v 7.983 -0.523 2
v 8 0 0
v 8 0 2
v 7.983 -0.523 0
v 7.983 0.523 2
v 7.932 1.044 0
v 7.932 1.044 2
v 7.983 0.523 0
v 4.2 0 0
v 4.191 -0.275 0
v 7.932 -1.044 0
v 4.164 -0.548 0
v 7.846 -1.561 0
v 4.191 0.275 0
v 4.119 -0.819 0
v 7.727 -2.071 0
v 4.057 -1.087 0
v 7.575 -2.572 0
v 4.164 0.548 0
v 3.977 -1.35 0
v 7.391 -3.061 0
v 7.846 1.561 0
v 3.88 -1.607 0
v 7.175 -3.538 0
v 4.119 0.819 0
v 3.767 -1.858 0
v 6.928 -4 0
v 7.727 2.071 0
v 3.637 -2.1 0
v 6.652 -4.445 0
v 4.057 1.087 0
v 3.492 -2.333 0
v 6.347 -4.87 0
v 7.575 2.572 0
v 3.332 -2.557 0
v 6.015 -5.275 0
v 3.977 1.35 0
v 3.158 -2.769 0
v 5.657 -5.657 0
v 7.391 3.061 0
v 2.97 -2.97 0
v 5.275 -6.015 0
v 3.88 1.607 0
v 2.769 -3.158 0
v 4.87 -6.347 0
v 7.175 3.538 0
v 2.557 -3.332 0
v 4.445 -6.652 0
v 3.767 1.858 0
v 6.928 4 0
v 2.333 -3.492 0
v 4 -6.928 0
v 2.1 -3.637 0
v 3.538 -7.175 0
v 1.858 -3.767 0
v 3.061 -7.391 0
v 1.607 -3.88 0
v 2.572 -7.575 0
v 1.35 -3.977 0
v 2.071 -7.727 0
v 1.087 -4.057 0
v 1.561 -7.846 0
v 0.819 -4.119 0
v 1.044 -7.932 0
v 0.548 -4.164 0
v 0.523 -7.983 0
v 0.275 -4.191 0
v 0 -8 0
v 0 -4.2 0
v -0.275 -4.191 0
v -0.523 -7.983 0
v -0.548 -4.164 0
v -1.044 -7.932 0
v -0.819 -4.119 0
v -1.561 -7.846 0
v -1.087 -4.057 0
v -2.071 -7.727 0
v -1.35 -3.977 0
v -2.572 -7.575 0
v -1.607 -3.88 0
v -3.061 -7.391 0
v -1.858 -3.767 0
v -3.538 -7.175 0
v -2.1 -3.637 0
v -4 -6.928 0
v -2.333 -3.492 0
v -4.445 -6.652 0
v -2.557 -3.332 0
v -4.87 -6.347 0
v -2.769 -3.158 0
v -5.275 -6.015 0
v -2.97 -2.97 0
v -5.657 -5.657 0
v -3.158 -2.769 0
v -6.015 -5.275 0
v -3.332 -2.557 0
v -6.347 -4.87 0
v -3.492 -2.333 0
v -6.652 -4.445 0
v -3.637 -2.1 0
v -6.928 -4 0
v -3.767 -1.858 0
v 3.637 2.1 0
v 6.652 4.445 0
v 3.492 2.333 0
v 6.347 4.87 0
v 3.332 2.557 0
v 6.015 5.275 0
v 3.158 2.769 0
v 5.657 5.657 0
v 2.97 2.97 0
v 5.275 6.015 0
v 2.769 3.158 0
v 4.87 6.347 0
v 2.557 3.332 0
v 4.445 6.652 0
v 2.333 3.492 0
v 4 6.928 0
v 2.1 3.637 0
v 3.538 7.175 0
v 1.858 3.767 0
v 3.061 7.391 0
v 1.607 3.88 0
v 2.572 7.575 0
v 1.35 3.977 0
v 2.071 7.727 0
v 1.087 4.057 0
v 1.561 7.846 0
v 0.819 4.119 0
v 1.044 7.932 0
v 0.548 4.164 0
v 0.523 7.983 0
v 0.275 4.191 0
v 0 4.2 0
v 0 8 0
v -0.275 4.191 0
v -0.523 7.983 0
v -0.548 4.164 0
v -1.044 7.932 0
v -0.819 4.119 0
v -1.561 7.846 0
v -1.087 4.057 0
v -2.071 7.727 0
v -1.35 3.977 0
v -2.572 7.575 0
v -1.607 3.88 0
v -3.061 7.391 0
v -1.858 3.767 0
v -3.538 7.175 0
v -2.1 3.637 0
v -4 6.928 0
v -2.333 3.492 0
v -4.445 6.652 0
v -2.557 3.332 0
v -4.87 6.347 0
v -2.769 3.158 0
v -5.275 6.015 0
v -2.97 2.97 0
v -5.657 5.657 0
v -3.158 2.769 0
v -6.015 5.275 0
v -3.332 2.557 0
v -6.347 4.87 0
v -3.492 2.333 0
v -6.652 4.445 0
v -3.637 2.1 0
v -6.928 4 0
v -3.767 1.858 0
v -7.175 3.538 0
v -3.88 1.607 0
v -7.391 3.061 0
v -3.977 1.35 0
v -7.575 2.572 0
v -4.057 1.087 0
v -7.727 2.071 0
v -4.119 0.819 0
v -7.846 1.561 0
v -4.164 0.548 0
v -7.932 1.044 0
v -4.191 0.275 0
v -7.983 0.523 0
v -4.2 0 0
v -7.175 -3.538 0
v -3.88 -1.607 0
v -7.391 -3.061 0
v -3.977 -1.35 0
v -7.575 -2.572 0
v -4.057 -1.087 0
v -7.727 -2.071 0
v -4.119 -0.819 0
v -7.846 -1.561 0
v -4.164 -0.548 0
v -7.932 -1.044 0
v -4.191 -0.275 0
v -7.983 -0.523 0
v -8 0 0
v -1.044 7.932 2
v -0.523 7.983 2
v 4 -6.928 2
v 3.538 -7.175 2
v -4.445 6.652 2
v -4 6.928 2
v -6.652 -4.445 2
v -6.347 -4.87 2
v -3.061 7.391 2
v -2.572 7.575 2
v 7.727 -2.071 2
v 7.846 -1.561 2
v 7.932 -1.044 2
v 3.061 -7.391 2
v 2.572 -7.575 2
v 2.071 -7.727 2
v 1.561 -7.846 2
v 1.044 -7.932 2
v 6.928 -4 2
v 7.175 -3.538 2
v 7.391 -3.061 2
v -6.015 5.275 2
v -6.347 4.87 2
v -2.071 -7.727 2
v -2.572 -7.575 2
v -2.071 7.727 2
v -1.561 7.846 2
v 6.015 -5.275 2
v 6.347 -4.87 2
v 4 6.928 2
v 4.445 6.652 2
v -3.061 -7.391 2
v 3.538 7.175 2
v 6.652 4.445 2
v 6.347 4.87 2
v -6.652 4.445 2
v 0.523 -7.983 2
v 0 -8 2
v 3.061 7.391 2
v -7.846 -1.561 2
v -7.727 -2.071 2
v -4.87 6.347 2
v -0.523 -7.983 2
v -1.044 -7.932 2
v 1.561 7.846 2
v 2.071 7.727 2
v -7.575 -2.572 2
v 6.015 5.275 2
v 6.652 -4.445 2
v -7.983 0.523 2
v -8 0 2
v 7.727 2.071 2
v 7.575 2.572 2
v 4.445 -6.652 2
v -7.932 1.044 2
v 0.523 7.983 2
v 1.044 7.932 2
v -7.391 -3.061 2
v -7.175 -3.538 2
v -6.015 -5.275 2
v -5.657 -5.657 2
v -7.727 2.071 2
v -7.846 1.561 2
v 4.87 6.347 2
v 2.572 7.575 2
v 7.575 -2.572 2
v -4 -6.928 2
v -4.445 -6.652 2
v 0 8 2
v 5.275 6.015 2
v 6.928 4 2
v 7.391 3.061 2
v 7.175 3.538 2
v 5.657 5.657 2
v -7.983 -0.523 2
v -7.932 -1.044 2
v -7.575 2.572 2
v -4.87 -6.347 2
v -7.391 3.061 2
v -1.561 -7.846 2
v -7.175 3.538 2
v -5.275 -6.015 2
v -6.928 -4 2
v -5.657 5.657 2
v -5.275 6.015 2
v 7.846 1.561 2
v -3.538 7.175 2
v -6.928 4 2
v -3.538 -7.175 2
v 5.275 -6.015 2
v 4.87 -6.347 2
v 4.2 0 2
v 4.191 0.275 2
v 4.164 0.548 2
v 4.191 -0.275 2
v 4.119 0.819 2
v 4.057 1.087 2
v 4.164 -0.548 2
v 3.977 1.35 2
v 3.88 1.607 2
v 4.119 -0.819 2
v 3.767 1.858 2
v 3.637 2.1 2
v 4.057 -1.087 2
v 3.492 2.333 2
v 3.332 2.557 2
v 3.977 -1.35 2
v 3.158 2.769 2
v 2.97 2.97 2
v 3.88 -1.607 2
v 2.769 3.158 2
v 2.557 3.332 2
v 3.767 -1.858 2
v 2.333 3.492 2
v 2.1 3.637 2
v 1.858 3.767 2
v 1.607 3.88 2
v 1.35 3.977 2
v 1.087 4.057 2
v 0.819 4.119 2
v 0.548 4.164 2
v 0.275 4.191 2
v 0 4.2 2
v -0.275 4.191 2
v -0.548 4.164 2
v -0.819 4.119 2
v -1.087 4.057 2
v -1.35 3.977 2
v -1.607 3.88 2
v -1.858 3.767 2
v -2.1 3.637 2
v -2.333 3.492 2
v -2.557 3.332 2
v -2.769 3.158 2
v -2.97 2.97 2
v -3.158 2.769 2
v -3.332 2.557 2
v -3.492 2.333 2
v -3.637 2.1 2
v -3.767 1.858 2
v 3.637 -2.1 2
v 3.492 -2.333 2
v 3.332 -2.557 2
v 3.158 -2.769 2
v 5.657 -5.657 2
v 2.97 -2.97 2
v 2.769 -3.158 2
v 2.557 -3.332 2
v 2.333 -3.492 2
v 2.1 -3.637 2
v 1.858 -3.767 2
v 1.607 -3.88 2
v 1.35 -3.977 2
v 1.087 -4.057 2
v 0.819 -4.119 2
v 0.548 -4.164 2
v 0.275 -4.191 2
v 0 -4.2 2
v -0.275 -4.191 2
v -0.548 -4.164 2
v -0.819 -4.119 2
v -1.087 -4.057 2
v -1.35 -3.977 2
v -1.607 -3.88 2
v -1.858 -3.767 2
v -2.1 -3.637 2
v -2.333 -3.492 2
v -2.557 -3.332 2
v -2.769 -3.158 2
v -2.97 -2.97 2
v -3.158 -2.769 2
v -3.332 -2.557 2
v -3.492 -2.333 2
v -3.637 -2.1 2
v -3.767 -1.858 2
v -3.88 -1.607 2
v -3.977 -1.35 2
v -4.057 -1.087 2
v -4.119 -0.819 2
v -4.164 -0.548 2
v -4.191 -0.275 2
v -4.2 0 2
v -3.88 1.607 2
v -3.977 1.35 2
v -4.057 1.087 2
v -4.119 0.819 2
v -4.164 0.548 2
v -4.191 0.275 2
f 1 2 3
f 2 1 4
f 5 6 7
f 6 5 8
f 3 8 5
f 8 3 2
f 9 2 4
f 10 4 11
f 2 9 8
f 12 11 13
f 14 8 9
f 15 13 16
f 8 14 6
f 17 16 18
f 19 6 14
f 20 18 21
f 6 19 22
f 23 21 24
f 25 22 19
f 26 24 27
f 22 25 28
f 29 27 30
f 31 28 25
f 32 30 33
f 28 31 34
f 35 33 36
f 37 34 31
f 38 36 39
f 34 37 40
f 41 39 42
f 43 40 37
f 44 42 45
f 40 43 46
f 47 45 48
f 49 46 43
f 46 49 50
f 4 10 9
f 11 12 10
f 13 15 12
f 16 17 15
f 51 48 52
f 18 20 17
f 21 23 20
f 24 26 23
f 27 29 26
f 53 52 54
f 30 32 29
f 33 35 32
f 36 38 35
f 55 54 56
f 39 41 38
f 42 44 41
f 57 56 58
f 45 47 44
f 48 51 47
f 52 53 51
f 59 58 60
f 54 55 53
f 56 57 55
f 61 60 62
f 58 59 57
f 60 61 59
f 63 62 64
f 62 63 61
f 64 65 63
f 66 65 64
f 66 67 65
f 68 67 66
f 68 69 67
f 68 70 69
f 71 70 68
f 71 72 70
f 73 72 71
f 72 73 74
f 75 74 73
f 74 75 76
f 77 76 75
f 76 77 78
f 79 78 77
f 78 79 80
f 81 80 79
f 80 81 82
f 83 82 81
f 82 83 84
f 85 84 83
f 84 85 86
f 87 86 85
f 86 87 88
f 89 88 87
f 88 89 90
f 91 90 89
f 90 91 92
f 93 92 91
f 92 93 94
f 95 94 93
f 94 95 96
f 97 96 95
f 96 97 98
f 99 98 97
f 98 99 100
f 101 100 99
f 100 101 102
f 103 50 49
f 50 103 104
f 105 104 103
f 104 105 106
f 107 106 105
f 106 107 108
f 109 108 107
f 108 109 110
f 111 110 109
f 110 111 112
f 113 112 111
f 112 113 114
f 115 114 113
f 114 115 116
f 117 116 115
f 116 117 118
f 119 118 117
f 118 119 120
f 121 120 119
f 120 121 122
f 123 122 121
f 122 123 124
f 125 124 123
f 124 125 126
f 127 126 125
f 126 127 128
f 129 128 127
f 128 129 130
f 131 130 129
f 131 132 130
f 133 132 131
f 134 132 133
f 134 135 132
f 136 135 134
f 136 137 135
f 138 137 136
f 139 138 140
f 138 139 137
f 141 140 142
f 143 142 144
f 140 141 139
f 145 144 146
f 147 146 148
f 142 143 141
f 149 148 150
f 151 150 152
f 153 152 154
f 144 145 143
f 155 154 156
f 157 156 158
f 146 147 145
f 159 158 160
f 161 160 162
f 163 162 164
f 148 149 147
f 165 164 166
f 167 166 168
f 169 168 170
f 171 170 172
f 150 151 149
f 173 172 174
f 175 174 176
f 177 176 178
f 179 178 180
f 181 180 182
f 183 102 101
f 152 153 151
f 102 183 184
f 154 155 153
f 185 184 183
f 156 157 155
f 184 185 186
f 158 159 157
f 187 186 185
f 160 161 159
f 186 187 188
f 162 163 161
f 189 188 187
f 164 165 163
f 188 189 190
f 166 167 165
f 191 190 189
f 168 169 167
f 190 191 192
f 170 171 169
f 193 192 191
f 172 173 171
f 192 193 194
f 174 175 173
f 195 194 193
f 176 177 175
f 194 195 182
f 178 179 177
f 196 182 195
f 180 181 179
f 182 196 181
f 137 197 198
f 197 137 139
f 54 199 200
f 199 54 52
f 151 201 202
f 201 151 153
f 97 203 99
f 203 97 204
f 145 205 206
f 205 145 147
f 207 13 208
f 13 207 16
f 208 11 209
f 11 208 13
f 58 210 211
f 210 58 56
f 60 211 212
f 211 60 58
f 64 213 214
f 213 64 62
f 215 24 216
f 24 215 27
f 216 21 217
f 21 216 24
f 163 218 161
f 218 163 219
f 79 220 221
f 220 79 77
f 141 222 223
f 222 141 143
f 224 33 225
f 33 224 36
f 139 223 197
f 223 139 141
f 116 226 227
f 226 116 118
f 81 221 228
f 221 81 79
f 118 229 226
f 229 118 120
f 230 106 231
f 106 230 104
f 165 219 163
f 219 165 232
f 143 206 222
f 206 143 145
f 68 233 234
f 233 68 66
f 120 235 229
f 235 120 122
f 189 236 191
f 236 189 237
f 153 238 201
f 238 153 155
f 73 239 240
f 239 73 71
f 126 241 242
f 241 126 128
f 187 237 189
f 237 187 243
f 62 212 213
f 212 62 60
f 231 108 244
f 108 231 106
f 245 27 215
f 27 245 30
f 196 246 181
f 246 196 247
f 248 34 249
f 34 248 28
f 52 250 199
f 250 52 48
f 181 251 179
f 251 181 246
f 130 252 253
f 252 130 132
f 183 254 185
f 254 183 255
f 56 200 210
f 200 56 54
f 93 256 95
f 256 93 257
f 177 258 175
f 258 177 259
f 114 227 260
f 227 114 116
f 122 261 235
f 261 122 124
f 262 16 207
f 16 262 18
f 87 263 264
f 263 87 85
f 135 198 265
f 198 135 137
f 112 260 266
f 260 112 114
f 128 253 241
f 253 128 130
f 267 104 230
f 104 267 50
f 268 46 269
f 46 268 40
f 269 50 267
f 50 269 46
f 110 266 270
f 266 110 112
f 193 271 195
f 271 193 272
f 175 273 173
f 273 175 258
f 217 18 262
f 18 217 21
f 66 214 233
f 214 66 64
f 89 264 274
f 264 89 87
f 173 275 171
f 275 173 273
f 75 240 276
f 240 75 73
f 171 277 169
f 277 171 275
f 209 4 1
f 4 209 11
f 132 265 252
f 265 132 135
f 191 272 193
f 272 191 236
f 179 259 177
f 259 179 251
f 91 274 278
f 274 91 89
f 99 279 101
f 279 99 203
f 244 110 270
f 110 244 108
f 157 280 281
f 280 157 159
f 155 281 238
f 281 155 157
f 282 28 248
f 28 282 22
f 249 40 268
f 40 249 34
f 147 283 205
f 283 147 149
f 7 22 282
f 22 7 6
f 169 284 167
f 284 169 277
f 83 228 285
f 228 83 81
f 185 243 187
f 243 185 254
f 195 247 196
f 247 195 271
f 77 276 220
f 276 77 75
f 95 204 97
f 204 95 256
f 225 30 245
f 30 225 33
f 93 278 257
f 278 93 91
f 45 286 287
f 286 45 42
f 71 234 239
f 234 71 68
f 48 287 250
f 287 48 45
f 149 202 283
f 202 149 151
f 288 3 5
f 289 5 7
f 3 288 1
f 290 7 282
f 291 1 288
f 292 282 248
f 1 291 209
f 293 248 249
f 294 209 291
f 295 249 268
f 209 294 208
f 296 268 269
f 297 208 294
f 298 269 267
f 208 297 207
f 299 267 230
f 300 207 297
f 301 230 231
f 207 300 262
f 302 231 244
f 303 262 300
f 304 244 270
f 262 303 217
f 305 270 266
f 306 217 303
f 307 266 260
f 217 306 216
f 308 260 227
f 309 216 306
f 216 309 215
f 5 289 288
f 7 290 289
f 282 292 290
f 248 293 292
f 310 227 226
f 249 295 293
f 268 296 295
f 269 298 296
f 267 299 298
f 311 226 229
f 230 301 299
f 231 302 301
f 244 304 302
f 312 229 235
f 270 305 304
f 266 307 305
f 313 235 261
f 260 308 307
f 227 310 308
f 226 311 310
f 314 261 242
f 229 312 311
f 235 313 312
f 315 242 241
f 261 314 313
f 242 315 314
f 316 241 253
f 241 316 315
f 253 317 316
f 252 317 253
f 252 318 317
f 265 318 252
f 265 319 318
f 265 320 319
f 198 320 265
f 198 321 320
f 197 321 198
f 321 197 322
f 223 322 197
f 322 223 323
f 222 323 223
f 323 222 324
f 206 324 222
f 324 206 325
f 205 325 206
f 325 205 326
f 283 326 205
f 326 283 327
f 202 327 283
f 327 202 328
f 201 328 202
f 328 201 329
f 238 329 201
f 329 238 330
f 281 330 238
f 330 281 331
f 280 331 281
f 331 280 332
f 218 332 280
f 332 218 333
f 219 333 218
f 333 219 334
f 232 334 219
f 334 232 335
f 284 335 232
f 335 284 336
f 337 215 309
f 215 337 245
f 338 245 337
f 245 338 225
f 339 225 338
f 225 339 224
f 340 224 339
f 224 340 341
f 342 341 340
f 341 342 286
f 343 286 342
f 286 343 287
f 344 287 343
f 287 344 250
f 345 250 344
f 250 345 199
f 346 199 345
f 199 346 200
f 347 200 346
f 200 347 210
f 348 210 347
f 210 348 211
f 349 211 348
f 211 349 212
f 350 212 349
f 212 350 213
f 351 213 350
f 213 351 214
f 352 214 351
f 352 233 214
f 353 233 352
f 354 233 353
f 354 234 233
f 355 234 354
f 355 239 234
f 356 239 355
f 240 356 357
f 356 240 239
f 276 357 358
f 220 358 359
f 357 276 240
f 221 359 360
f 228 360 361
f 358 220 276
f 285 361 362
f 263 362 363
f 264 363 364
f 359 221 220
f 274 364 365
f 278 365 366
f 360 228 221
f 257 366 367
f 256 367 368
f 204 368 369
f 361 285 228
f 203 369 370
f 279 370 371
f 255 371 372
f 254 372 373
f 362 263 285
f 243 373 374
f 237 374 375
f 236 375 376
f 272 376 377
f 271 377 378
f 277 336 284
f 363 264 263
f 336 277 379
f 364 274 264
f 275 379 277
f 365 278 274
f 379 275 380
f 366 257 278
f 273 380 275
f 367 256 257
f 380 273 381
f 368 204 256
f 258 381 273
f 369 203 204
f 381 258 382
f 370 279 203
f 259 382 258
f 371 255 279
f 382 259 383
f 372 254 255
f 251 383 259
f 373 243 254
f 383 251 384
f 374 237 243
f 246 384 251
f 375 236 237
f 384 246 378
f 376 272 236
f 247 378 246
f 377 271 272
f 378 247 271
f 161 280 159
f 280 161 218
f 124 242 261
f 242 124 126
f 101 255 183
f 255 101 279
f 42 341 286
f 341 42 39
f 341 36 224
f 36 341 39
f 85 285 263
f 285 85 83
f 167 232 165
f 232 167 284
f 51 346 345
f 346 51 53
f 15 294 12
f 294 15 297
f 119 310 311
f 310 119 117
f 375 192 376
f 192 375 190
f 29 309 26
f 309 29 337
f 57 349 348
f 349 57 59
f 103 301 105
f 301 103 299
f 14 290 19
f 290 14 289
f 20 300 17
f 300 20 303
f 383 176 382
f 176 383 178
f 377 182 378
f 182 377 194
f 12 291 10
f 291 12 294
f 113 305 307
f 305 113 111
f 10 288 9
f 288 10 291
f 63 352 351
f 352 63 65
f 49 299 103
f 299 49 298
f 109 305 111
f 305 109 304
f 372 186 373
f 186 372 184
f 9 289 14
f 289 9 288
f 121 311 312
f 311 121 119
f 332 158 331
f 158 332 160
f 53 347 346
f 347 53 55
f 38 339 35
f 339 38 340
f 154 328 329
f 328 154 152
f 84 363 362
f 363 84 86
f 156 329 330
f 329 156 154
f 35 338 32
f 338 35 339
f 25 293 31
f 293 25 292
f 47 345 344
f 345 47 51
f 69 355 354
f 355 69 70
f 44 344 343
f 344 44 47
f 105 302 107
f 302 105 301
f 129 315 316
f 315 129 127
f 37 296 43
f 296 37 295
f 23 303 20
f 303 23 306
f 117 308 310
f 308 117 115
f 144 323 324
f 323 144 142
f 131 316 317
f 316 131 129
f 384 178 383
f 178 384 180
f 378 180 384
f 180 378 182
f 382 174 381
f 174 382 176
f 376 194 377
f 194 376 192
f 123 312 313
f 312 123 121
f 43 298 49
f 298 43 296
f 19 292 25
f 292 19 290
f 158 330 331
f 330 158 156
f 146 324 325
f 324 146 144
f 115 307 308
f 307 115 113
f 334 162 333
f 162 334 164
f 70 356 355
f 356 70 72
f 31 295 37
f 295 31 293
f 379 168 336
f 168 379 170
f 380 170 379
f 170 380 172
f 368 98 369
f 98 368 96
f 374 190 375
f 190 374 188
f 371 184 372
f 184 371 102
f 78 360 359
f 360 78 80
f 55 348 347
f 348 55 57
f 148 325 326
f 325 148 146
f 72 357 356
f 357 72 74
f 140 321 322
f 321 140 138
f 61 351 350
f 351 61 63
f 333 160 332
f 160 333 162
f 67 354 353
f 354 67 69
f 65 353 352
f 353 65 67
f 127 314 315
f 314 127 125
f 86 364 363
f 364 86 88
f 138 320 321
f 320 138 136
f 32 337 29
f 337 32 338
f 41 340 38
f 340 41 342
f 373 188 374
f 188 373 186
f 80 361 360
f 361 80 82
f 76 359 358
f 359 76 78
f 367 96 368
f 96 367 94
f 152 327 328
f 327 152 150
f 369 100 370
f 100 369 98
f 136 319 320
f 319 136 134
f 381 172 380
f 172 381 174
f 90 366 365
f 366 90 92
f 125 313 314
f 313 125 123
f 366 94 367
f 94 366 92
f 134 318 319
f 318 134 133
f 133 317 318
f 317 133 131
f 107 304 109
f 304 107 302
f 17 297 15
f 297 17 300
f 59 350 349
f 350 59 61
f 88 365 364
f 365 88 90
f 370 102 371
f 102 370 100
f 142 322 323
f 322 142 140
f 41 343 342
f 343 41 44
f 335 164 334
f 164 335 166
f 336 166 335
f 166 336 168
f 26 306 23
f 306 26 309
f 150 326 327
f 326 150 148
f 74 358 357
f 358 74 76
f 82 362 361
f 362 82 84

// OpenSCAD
// Distanziale / rondella: anello con diametro interno, esterno e spessore.
diametro_interno = 8.4;
diametro_esterno = 16;
spessore = 2;

$fn = 96;

difference() {
    cylinder(d = diametro_esterno, h = spessore);
    translate([0, 0, -1]) cylinder(d = diametro_interno, h = spessore + 2);
}
